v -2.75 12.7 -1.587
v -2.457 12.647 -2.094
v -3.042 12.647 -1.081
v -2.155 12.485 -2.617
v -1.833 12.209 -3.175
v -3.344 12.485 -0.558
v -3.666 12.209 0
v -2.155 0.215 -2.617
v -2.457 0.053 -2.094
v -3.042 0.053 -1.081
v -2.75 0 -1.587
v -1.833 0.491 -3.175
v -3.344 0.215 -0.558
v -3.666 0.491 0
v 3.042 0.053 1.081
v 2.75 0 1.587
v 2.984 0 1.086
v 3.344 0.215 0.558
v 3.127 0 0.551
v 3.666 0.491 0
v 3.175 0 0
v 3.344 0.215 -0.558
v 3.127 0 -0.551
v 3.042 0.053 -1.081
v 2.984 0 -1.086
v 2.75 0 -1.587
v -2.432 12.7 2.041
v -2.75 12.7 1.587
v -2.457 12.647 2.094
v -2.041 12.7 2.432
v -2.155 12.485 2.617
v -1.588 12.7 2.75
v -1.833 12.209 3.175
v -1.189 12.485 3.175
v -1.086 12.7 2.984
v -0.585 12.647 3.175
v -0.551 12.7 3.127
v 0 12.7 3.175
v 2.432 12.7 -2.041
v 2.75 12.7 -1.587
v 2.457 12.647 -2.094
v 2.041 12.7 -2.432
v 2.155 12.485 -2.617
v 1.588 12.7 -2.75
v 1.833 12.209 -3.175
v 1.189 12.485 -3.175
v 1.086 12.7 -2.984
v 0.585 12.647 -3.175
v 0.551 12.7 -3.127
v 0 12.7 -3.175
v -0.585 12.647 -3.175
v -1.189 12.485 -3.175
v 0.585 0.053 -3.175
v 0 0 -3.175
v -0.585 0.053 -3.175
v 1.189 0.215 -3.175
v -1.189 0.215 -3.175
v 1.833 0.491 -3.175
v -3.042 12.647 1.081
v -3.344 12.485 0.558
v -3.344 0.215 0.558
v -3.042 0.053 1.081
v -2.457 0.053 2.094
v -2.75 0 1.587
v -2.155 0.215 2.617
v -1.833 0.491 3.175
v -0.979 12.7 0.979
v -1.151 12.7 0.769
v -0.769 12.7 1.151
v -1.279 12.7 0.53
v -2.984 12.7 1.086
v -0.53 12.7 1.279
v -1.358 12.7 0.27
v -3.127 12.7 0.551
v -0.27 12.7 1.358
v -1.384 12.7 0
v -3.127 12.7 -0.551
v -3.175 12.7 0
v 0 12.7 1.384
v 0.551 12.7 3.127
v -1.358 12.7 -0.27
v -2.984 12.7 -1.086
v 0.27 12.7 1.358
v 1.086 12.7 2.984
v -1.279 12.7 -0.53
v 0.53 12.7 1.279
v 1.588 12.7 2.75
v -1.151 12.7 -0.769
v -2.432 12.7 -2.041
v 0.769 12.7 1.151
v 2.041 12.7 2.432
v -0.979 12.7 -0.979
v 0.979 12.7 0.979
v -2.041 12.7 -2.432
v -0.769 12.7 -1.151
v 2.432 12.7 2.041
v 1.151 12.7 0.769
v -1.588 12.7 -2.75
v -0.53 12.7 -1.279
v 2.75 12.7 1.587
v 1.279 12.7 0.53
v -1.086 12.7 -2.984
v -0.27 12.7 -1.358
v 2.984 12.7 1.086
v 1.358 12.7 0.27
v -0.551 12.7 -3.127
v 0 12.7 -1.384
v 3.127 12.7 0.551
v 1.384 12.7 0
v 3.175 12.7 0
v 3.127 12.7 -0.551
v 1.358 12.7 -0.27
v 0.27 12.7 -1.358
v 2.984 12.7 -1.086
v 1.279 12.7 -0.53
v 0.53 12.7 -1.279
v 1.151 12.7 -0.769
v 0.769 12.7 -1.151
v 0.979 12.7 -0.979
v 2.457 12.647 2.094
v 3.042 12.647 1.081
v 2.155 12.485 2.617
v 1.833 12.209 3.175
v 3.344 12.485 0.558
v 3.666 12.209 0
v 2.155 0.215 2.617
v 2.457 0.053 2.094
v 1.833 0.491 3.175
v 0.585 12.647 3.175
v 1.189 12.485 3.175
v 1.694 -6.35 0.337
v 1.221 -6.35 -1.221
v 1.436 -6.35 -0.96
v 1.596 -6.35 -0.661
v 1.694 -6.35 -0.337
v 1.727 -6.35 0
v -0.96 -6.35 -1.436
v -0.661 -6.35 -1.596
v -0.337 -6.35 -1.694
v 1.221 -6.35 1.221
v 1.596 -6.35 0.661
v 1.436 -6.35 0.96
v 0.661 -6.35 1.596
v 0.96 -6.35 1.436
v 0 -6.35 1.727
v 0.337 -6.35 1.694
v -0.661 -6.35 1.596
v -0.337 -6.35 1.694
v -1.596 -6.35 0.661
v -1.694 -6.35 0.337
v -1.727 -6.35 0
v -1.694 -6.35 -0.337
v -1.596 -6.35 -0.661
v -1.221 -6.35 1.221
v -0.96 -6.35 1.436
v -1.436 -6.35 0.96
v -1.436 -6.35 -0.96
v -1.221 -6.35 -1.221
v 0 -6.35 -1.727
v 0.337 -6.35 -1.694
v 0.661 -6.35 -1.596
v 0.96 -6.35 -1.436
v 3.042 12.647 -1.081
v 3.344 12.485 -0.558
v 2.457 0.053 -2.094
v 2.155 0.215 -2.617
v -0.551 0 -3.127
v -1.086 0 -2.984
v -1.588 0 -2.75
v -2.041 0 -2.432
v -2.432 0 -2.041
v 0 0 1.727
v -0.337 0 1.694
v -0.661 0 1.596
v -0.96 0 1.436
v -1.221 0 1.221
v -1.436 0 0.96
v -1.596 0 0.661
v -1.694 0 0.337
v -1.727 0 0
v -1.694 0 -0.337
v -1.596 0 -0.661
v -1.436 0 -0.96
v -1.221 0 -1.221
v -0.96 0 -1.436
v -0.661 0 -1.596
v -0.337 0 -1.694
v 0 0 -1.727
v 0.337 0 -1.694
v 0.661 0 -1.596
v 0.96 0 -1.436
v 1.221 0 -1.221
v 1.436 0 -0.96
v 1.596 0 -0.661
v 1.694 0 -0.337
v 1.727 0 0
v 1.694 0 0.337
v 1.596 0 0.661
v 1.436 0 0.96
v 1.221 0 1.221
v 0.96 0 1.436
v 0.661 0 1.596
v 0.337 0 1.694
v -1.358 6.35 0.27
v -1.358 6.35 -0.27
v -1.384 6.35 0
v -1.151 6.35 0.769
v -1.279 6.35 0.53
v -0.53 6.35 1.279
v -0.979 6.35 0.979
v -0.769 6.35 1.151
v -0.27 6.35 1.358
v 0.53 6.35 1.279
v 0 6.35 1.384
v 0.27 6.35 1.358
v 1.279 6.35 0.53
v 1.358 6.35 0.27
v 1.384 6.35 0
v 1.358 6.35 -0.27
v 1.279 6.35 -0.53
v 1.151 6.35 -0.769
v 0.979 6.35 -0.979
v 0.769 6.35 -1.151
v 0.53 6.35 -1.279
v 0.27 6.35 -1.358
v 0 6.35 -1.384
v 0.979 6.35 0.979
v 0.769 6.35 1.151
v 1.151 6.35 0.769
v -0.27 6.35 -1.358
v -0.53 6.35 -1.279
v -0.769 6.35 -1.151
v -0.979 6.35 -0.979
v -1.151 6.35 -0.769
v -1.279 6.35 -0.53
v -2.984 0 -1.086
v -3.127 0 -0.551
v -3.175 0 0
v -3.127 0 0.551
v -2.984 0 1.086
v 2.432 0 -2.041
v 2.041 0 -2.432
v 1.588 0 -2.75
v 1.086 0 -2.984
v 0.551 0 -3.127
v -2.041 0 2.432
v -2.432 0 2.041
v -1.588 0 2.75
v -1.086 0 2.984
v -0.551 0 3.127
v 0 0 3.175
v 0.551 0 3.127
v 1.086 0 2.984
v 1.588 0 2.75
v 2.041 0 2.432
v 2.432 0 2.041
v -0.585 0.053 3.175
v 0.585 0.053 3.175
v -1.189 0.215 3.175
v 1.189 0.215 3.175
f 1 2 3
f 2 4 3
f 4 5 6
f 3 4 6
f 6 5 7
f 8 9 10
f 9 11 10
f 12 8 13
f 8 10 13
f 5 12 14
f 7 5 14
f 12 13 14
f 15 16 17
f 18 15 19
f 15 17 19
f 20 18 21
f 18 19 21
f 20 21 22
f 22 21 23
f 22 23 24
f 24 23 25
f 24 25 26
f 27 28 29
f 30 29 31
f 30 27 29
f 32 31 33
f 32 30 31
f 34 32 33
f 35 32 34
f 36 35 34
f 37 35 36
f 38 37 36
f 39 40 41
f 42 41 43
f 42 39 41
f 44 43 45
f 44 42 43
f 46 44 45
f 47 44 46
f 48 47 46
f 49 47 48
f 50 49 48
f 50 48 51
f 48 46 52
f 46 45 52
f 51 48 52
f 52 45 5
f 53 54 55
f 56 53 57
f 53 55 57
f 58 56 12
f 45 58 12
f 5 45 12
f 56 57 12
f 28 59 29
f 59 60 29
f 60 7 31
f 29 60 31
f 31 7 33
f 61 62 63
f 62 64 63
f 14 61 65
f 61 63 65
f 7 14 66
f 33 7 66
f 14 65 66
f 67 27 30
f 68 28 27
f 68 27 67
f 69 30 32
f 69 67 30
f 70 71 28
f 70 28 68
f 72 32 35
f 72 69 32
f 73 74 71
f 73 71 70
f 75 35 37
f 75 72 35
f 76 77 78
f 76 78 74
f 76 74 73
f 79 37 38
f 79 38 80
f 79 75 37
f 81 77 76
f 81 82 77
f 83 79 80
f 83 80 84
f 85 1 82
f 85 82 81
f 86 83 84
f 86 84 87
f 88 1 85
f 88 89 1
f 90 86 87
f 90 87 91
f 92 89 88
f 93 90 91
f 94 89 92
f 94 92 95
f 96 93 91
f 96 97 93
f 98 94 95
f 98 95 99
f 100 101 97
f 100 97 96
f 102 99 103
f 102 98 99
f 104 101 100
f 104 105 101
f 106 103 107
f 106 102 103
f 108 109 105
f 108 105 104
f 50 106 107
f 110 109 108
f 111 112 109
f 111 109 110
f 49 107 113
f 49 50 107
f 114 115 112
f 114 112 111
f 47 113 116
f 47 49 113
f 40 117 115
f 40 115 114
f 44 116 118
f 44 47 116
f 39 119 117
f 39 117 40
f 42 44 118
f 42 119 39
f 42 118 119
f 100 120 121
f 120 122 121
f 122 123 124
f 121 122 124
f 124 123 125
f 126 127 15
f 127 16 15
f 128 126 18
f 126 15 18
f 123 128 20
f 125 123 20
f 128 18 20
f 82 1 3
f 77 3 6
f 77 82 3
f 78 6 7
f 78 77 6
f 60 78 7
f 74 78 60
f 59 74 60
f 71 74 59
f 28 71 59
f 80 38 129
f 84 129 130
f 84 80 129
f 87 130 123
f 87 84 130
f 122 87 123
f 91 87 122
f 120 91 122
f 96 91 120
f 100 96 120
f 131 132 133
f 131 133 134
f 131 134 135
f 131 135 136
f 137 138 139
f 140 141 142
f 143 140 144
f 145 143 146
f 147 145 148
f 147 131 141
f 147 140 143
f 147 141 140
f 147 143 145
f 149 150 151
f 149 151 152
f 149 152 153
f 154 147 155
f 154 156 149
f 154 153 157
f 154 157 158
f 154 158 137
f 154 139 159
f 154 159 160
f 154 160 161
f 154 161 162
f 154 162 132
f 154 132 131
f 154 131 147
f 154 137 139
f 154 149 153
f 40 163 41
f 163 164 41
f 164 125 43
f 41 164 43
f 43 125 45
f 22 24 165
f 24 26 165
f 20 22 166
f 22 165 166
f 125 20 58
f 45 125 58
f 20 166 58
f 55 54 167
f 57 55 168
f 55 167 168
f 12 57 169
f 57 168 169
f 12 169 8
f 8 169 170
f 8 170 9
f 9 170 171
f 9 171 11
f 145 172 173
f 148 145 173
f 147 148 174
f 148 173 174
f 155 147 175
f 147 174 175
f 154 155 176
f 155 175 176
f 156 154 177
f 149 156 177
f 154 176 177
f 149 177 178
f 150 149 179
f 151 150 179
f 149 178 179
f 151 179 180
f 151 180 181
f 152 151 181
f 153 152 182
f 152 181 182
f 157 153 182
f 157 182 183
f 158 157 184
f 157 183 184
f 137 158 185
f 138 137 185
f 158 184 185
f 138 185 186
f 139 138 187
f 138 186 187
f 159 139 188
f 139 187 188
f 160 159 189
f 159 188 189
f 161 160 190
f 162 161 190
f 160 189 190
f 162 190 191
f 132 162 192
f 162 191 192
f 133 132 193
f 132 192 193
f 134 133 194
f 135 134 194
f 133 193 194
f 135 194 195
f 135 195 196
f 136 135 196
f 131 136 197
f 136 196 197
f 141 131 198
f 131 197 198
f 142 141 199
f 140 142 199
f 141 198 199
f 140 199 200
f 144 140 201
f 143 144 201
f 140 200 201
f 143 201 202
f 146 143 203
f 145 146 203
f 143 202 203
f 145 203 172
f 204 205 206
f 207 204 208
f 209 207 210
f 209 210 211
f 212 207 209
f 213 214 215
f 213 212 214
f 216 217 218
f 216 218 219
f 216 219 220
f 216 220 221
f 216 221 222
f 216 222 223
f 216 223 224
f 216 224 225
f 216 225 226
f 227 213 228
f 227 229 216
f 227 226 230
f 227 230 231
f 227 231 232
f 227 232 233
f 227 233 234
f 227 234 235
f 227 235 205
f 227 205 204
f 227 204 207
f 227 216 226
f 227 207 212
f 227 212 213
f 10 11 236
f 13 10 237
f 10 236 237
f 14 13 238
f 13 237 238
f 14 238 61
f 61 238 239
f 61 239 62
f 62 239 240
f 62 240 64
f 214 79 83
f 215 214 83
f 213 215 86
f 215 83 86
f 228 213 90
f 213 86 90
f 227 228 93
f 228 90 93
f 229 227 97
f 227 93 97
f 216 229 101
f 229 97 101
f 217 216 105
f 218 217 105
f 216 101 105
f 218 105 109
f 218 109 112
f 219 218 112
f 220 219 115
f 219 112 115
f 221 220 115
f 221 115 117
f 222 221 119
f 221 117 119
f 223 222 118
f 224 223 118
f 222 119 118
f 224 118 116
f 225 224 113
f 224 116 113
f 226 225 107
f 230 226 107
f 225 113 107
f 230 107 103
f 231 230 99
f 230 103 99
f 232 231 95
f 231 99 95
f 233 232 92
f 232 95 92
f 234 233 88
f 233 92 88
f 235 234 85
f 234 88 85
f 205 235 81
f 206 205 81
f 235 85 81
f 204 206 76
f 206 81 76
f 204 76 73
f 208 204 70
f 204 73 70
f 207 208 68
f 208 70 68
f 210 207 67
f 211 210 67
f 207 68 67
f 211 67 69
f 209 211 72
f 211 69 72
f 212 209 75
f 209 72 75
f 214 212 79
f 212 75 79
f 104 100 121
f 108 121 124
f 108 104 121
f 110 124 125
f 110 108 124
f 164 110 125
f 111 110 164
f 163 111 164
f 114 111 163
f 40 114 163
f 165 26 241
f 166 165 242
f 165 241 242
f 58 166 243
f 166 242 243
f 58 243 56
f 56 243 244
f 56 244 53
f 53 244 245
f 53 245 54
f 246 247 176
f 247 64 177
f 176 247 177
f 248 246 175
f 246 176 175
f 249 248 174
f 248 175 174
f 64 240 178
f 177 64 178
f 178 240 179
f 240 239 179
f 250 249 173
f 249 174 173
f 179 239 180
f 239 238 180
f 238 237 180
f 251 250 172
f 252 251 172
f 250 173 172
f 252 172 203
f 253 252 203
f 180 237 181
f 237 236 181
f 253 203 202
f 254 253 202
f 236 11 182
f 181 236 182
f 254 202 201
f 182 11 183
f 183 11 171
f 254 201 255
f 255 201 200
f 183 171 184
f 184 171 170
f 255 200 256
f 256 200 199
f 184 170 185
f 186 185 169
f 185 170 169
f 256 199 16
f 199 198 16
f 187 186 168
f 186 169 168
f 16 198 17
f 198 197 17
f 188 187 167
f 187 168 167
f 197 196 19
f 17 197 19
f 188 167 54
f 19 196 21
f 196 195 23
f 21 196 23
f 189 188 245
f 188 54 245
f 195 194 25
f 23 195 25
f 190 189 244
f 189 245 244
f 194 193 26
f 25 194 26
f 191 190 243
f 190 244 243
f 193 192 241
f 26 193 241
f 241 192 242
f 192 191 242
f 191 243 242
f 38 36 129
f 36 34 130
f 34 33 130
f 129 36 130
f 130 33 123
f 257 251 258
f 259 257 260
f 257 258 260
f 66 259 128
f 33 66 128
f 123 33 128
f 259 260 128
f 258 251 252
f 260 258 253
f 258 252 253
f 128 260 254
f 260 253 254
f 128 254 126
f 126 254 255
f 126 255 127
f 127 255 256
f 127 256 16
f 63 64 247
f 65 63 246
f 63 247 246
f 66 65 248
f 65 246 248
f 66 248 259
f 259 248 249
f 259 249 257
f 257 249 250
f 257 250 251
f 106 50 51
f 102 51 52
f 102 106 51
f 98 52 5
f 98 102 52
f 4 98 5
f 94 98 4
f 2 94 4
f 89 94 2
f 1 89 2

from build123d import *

# Parameters (mm, degrees)
BOSS_EXTRUDE1_DEPTH = 12.7
SKETCH5_R           = 1.3843
CUT_EXTRUDE1_DEPTH  = 6.35
SKETCH6_R           = 1.7272
BOSS_EXTRUDE2_DEPTH = 6.35


with BuildPart() as part:
    # Sketch1 → Boss-Extrude1 (new body)
    with BuildSketch(Plane(origin=(0, 0, 0), x_dir=(1, 0, 0), z_dir=(0, 1, 0))):
        Polygon((3.666174209, 0), (1.833087105, 3.175), (-1.833087105, 3.175), (-3.666174209, 0), (-1.833087105, -3.175), (1.833087105, -3.175), align=None)
    extrude(amount=BOSS_EXTRUDE1_DEPTH)

    # Sketch2 → Cut-Revolve1 (revolve, cut)
    with BuildSketch(Plane.XY):
        Polygon((-3.666174209, 0.491174209), (-3.175, 0), (-3.666174209, 0), align=None)
        Polygon((-3.666174209, 12.7), (-3.666174209, 12.208825791), (-3.175, 12.7), align=None)
    revolve(axis=Axis((0, 0, 0), (0, 1, 0)), mode=Mode.SUBTRACT)

    # Sketch5 → Cut-Extrude1 (cut)
    with BuildSketch(Plane(origin=(0, 12.7, 0), x_dir=(1, 0, 0), z_dir=(0, 1, 0))):
        with Locations(Location((0, 0, 0), (0, 0, 270))):
            Circle(SKETCH5_R)
    extrude(amount=-CUT_EXTRUDE1_DEPTH, mode=Mode.SUBTRACT)

    # Sketch6 → Boss-Extrude2 (add)
    with BuildSketch(Plane.XZ):
        with Locations(Location((0, 0, 0), (0, 0, 90))):
            Circle(SKETCH6_R)
    extrude(amount=BOSS_EXTRUDE2_DEPTH)


solid = part.part
